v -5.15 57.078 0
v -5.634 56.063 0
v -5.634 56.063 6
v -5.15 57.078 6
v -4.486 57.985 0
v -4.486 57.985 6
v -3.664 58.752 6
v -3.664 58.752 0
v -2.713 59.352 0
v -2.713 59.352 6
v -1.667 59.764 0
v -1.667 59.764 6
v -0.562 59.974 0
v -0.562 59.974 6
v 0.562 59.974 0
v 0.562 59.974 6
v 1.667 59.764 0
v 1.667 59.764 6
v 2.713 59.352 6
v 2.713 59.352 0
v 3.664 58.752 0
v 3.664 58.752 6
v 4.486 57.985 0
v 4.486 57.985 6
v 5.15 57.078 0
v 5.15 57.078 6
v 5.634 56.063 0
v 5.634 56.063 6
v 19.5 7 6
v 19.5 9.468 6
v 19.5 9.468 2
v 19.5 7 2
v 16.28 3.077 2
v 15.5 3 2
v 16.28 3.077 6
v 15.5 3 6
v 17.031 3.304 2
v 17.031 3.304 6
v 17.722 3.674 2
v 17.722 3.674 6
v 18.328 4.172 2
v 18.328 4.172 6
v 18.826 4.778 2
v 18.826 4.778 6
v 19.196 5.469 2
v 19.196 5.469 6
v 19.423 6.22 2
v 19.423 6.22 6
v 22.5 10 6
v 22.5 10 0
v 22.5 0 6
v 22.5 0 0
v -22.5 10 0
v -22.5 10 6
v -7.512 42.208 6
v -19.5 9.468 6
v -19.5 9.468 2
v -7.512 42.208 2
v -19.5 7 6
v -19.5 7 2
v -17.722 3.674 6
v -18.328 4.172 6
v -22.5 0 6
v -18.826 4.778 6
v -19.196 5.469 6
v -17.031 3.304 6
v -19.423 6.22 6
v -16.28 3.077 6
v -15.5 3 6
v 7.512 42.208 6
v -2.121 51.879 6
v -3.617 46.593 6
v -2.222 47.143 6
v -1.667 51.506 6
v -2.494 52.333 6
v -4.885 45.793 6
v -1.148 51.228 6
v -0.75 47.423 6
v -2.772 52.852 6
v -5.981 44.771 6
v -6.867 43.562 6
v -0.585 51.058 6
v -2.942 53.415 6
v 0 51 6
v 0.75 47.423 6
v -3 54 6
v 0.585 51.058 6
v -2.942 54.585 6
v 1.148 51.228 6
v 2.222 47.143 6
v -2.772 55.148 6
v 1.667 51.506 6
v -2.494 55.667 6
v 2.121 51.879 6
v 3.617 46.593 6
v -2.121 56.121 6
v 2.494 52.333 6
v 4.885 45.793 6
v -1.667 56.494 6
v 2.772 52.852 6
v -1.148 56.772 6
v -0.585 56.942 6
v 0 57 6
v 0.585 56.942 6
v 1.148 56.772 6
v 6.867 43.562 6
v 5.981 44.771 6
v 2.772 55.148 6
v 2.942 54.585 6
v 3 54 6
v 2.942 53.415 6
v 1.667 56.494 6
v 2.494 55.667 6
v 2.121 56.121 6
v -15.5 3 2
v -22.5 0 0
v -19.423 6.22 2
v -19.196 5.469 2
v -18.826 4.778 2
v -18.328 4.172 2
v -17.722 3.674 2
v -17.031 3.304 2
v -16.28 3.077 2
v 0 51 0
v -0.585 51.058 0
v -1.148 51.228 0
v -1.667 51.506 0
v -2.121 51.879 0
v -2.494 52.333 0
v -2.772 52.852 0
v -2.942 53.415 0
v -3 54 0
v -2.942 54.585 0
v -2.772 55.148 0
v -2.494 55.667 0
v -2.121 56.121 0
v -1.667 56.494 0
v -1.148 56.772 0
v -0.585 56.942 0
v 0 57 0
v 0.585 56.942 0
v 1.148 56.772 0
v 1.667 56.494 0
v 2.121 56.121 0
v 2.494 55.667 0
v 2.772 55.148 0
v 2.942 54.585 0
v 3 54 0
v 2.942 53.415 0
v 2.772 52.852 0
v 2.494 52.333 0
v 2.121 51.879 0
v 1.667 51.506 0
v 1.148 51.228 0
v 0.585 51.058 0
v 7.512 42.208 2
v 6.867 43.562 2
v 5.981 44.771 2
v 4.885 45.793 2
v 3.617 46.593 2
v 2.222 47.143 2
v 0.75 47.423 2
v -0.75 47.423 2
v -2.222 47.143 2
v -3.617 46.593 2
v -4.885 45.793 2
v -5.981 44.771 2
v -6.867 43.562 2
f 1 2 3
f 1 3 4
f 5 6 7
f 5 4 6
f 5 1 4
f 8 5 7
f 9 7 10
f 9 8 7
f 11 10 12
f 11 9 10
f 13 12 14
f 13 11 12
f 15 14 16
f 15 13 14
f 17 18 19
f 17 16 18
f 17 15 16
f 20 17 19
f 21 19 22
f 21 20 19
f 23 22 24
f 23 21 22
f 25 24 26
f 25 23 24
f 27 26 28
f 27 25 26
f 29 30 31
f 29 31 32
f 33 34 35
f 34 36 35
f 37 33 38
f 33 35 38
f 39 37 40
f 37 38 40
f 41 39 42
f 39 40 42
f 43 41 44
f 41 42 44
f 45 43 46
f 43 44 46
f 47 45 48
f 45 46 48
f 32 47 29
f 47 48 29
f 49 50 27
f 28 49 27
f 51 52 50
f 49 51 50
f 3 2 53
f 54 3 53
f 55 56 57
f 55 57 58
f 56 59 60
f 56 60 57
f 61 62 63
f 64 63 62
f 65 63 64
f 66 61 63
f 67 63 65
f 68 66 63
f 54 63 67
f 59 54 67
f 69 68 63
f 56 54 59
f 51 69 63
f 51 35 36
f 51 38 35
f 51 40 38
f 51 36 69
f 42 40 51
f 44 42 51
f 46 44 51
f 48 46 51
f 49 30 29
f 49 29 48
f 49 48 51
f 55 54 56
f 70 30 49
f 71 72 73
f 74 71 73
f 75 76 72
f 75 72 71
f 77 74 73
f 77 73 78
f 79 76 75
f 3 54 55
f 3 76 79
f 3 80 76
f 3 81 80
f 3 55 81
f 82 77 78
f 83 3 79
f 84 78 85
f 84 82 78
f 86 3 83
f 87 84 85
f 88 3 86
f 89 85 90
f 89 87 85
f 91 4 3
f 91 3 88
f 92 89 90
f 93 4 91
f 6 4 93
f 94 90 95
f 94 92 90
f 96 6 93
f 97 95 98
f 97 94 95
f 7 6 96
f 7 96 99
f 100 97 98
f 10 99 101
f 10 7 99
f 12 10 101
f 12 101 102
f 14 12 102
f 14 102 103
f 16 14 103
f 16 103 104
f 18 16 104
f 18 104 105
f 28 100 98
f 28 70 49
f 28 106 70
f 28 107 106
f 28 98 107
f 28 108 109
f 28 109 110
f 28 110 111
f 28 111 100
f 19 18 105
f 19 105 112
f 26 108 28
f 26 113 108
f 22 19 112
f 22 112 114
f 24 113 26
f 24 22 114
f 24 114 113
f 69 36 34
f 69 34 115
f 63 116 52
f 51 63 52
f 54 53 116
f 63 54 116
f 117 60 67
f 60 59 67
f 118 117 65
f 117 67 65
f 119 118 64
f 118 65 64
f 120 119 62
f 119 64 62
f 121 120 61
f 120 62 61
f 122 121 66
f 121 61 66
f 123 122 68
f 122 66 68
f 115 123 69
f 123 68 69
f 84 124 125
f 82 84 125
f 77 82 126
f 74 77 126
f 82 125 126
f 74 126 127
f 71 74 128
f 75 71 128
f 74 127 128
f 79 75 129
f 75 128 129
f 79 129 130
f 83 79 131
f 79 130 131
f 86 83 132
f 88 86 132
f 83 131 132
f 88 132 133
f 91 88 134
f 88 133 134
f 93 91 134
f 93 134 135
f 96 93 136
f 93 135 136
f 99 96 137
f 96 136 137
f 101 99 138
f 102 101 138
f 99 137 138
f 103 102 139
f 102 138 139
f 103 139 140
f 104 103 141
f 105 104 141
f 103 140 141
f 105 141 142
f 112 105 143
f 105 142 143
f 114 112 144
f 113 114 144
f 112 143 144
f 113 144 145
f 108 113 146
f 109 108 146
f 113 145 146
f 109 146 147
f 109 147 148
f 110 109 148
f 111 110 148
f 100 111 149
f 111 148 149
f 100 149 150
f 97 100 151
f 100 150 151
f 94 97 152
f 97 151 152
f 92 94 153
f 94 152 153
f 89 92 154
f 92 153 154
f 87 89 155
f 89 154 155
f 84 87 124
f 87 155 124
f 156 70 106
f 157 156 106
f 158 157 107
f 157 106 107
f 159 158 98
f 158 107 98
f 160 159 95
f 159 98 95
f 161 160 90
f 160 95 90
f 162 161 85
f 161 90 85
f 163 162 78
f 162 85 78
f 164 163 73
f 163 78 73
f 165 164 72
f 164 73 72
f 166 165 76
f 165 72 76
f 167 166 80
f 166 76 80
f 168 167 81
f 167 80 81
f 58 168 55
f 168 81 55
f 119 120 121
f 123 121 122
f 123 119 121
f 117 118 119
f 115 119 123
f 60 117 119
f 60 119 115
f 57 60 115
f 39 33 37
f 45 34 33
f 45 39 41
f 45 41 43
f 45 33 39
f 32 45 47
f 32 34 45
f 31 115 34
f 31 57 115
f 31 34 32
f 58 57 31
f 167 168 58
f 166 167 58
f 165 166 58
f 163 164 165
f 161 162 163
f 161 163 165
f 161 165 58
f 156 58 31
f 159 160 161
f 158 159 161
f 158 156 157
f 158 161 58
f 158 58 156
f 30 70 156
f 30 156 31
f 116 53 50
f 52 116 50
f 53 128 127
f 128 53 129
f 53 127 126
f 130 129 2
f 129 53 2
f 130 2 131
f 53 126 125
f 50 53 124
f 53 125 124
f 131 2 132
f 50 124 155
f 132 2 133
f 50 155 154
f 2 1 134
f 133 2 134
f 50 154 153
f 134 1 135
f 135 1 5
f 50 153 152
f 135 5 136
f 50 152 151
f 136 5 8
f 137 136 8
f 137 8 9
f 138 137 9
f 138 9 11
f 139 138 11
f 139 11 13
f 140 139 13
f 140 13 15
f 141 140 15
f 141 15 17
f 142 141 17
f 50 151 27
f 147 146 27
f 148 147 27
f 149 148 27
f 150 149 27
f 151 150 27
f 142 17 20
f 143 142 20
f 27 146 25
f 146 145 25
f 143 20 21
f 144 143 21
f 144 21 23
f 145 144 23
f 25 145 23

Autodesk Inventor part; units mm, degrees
ref_plane "YZ Plane" through (0, 0, 0) normal (1, 0, 0) x (0, 1, 0)
ref_plane "XZ Plane" through (0, 0, 0) normal (0, 1, 0) x (-1, 0, 0)
ref_plane "XY Plane" through (0, 0, 0) normal (0, 0, 1) x (1, 0, 0)
sketch "Sketch1" plane through (0, 0, 0) normal (0, 0, 1) x (1, 0, 0)
  line L0 (-22.5, 0) -> (22.5, 0)
  line L1 (22.5, 0) -> (22.5, 10)
  line L2 (22.5, 10) -> (5.6342, 56.0629)
  arc A0 (5.6342, 56.0629) -> (-5.6342, 56.0629) centre (0, 54) ccw
  line L3 (-5.6342, 56.0629) -> (-22.5, 10)
  line L4 (-22.5, 10) -> (-22.5, 0)
  point P0 (0, 0)
  point P1 (0, 0)
  dimension "d0" = 45
  dimension "d1" = 10
  dimension "d2" = 6
  dimension "d3" = 54
extrude "Extrusion1" add sketch "Sketch1" along normal blind 6
sketch "Sketch2" plane through (0, 0, 6) normal (0, 0, 1) x (1, 0, 0)
  line L0 (22.5, 0) -> (22.5, 10) projected
  line L1 (22.5, 10) -> (5.6342, 56.0629) projected
  line L2 (-5.6342, 56.0629) -> (-22.5, 10) projected
  line L3 (-22.5, 10) -> (-22.5, 0) projected
  line L4 (-22.5, 0) -> (22.5, 0) projected
  line L5 (-19.5, 9.468) -> (-7.5123, 42.2083)
  line L6 (7.5123, 42.2083) -> (19.5, 9.468)
  line L7 (19.5, 9.468) -> (19.5, 7)
  line L8 (15.5, 3) -> (-15.5, 3)
  line L9 (-19.5, 7) -> (-19.5, 9.468)
  arc A0 (7.5123, 42.2083) -> (-7.5123, 42.2083) centre (0, 39.4577) ccw
  arc A1 (-19.5, 7) -> (-15.5, 3) centre (-15.5, 7) ccw
  arc A2 (15.5, 3) -> (19.5, 7) centre (15.5, 7) ccw
  point P0 (0, 0)
  dimension "d6" = 3
  dimension "d7" = 8
  dimension "d8" = 3
  dimension "d9" = 4
extrude "Extrusion2" cut sketch "Sketch2" against normal blind 4
sketch "Sketch3" plane through (0, 0, 6) normal (0, 0, 1) x (1, 0, 0)
  arc A0 (5.6342, 56.0629) -> (-5.6342, 56.0629) centre (0, 54) ccw projected
  point P0 (0, 0)
hole "Hole1" at (0, 54, 6) direction (0, 0, -1) diameter 6 end through all
properties part number "Bearing Short" material "Steel"
